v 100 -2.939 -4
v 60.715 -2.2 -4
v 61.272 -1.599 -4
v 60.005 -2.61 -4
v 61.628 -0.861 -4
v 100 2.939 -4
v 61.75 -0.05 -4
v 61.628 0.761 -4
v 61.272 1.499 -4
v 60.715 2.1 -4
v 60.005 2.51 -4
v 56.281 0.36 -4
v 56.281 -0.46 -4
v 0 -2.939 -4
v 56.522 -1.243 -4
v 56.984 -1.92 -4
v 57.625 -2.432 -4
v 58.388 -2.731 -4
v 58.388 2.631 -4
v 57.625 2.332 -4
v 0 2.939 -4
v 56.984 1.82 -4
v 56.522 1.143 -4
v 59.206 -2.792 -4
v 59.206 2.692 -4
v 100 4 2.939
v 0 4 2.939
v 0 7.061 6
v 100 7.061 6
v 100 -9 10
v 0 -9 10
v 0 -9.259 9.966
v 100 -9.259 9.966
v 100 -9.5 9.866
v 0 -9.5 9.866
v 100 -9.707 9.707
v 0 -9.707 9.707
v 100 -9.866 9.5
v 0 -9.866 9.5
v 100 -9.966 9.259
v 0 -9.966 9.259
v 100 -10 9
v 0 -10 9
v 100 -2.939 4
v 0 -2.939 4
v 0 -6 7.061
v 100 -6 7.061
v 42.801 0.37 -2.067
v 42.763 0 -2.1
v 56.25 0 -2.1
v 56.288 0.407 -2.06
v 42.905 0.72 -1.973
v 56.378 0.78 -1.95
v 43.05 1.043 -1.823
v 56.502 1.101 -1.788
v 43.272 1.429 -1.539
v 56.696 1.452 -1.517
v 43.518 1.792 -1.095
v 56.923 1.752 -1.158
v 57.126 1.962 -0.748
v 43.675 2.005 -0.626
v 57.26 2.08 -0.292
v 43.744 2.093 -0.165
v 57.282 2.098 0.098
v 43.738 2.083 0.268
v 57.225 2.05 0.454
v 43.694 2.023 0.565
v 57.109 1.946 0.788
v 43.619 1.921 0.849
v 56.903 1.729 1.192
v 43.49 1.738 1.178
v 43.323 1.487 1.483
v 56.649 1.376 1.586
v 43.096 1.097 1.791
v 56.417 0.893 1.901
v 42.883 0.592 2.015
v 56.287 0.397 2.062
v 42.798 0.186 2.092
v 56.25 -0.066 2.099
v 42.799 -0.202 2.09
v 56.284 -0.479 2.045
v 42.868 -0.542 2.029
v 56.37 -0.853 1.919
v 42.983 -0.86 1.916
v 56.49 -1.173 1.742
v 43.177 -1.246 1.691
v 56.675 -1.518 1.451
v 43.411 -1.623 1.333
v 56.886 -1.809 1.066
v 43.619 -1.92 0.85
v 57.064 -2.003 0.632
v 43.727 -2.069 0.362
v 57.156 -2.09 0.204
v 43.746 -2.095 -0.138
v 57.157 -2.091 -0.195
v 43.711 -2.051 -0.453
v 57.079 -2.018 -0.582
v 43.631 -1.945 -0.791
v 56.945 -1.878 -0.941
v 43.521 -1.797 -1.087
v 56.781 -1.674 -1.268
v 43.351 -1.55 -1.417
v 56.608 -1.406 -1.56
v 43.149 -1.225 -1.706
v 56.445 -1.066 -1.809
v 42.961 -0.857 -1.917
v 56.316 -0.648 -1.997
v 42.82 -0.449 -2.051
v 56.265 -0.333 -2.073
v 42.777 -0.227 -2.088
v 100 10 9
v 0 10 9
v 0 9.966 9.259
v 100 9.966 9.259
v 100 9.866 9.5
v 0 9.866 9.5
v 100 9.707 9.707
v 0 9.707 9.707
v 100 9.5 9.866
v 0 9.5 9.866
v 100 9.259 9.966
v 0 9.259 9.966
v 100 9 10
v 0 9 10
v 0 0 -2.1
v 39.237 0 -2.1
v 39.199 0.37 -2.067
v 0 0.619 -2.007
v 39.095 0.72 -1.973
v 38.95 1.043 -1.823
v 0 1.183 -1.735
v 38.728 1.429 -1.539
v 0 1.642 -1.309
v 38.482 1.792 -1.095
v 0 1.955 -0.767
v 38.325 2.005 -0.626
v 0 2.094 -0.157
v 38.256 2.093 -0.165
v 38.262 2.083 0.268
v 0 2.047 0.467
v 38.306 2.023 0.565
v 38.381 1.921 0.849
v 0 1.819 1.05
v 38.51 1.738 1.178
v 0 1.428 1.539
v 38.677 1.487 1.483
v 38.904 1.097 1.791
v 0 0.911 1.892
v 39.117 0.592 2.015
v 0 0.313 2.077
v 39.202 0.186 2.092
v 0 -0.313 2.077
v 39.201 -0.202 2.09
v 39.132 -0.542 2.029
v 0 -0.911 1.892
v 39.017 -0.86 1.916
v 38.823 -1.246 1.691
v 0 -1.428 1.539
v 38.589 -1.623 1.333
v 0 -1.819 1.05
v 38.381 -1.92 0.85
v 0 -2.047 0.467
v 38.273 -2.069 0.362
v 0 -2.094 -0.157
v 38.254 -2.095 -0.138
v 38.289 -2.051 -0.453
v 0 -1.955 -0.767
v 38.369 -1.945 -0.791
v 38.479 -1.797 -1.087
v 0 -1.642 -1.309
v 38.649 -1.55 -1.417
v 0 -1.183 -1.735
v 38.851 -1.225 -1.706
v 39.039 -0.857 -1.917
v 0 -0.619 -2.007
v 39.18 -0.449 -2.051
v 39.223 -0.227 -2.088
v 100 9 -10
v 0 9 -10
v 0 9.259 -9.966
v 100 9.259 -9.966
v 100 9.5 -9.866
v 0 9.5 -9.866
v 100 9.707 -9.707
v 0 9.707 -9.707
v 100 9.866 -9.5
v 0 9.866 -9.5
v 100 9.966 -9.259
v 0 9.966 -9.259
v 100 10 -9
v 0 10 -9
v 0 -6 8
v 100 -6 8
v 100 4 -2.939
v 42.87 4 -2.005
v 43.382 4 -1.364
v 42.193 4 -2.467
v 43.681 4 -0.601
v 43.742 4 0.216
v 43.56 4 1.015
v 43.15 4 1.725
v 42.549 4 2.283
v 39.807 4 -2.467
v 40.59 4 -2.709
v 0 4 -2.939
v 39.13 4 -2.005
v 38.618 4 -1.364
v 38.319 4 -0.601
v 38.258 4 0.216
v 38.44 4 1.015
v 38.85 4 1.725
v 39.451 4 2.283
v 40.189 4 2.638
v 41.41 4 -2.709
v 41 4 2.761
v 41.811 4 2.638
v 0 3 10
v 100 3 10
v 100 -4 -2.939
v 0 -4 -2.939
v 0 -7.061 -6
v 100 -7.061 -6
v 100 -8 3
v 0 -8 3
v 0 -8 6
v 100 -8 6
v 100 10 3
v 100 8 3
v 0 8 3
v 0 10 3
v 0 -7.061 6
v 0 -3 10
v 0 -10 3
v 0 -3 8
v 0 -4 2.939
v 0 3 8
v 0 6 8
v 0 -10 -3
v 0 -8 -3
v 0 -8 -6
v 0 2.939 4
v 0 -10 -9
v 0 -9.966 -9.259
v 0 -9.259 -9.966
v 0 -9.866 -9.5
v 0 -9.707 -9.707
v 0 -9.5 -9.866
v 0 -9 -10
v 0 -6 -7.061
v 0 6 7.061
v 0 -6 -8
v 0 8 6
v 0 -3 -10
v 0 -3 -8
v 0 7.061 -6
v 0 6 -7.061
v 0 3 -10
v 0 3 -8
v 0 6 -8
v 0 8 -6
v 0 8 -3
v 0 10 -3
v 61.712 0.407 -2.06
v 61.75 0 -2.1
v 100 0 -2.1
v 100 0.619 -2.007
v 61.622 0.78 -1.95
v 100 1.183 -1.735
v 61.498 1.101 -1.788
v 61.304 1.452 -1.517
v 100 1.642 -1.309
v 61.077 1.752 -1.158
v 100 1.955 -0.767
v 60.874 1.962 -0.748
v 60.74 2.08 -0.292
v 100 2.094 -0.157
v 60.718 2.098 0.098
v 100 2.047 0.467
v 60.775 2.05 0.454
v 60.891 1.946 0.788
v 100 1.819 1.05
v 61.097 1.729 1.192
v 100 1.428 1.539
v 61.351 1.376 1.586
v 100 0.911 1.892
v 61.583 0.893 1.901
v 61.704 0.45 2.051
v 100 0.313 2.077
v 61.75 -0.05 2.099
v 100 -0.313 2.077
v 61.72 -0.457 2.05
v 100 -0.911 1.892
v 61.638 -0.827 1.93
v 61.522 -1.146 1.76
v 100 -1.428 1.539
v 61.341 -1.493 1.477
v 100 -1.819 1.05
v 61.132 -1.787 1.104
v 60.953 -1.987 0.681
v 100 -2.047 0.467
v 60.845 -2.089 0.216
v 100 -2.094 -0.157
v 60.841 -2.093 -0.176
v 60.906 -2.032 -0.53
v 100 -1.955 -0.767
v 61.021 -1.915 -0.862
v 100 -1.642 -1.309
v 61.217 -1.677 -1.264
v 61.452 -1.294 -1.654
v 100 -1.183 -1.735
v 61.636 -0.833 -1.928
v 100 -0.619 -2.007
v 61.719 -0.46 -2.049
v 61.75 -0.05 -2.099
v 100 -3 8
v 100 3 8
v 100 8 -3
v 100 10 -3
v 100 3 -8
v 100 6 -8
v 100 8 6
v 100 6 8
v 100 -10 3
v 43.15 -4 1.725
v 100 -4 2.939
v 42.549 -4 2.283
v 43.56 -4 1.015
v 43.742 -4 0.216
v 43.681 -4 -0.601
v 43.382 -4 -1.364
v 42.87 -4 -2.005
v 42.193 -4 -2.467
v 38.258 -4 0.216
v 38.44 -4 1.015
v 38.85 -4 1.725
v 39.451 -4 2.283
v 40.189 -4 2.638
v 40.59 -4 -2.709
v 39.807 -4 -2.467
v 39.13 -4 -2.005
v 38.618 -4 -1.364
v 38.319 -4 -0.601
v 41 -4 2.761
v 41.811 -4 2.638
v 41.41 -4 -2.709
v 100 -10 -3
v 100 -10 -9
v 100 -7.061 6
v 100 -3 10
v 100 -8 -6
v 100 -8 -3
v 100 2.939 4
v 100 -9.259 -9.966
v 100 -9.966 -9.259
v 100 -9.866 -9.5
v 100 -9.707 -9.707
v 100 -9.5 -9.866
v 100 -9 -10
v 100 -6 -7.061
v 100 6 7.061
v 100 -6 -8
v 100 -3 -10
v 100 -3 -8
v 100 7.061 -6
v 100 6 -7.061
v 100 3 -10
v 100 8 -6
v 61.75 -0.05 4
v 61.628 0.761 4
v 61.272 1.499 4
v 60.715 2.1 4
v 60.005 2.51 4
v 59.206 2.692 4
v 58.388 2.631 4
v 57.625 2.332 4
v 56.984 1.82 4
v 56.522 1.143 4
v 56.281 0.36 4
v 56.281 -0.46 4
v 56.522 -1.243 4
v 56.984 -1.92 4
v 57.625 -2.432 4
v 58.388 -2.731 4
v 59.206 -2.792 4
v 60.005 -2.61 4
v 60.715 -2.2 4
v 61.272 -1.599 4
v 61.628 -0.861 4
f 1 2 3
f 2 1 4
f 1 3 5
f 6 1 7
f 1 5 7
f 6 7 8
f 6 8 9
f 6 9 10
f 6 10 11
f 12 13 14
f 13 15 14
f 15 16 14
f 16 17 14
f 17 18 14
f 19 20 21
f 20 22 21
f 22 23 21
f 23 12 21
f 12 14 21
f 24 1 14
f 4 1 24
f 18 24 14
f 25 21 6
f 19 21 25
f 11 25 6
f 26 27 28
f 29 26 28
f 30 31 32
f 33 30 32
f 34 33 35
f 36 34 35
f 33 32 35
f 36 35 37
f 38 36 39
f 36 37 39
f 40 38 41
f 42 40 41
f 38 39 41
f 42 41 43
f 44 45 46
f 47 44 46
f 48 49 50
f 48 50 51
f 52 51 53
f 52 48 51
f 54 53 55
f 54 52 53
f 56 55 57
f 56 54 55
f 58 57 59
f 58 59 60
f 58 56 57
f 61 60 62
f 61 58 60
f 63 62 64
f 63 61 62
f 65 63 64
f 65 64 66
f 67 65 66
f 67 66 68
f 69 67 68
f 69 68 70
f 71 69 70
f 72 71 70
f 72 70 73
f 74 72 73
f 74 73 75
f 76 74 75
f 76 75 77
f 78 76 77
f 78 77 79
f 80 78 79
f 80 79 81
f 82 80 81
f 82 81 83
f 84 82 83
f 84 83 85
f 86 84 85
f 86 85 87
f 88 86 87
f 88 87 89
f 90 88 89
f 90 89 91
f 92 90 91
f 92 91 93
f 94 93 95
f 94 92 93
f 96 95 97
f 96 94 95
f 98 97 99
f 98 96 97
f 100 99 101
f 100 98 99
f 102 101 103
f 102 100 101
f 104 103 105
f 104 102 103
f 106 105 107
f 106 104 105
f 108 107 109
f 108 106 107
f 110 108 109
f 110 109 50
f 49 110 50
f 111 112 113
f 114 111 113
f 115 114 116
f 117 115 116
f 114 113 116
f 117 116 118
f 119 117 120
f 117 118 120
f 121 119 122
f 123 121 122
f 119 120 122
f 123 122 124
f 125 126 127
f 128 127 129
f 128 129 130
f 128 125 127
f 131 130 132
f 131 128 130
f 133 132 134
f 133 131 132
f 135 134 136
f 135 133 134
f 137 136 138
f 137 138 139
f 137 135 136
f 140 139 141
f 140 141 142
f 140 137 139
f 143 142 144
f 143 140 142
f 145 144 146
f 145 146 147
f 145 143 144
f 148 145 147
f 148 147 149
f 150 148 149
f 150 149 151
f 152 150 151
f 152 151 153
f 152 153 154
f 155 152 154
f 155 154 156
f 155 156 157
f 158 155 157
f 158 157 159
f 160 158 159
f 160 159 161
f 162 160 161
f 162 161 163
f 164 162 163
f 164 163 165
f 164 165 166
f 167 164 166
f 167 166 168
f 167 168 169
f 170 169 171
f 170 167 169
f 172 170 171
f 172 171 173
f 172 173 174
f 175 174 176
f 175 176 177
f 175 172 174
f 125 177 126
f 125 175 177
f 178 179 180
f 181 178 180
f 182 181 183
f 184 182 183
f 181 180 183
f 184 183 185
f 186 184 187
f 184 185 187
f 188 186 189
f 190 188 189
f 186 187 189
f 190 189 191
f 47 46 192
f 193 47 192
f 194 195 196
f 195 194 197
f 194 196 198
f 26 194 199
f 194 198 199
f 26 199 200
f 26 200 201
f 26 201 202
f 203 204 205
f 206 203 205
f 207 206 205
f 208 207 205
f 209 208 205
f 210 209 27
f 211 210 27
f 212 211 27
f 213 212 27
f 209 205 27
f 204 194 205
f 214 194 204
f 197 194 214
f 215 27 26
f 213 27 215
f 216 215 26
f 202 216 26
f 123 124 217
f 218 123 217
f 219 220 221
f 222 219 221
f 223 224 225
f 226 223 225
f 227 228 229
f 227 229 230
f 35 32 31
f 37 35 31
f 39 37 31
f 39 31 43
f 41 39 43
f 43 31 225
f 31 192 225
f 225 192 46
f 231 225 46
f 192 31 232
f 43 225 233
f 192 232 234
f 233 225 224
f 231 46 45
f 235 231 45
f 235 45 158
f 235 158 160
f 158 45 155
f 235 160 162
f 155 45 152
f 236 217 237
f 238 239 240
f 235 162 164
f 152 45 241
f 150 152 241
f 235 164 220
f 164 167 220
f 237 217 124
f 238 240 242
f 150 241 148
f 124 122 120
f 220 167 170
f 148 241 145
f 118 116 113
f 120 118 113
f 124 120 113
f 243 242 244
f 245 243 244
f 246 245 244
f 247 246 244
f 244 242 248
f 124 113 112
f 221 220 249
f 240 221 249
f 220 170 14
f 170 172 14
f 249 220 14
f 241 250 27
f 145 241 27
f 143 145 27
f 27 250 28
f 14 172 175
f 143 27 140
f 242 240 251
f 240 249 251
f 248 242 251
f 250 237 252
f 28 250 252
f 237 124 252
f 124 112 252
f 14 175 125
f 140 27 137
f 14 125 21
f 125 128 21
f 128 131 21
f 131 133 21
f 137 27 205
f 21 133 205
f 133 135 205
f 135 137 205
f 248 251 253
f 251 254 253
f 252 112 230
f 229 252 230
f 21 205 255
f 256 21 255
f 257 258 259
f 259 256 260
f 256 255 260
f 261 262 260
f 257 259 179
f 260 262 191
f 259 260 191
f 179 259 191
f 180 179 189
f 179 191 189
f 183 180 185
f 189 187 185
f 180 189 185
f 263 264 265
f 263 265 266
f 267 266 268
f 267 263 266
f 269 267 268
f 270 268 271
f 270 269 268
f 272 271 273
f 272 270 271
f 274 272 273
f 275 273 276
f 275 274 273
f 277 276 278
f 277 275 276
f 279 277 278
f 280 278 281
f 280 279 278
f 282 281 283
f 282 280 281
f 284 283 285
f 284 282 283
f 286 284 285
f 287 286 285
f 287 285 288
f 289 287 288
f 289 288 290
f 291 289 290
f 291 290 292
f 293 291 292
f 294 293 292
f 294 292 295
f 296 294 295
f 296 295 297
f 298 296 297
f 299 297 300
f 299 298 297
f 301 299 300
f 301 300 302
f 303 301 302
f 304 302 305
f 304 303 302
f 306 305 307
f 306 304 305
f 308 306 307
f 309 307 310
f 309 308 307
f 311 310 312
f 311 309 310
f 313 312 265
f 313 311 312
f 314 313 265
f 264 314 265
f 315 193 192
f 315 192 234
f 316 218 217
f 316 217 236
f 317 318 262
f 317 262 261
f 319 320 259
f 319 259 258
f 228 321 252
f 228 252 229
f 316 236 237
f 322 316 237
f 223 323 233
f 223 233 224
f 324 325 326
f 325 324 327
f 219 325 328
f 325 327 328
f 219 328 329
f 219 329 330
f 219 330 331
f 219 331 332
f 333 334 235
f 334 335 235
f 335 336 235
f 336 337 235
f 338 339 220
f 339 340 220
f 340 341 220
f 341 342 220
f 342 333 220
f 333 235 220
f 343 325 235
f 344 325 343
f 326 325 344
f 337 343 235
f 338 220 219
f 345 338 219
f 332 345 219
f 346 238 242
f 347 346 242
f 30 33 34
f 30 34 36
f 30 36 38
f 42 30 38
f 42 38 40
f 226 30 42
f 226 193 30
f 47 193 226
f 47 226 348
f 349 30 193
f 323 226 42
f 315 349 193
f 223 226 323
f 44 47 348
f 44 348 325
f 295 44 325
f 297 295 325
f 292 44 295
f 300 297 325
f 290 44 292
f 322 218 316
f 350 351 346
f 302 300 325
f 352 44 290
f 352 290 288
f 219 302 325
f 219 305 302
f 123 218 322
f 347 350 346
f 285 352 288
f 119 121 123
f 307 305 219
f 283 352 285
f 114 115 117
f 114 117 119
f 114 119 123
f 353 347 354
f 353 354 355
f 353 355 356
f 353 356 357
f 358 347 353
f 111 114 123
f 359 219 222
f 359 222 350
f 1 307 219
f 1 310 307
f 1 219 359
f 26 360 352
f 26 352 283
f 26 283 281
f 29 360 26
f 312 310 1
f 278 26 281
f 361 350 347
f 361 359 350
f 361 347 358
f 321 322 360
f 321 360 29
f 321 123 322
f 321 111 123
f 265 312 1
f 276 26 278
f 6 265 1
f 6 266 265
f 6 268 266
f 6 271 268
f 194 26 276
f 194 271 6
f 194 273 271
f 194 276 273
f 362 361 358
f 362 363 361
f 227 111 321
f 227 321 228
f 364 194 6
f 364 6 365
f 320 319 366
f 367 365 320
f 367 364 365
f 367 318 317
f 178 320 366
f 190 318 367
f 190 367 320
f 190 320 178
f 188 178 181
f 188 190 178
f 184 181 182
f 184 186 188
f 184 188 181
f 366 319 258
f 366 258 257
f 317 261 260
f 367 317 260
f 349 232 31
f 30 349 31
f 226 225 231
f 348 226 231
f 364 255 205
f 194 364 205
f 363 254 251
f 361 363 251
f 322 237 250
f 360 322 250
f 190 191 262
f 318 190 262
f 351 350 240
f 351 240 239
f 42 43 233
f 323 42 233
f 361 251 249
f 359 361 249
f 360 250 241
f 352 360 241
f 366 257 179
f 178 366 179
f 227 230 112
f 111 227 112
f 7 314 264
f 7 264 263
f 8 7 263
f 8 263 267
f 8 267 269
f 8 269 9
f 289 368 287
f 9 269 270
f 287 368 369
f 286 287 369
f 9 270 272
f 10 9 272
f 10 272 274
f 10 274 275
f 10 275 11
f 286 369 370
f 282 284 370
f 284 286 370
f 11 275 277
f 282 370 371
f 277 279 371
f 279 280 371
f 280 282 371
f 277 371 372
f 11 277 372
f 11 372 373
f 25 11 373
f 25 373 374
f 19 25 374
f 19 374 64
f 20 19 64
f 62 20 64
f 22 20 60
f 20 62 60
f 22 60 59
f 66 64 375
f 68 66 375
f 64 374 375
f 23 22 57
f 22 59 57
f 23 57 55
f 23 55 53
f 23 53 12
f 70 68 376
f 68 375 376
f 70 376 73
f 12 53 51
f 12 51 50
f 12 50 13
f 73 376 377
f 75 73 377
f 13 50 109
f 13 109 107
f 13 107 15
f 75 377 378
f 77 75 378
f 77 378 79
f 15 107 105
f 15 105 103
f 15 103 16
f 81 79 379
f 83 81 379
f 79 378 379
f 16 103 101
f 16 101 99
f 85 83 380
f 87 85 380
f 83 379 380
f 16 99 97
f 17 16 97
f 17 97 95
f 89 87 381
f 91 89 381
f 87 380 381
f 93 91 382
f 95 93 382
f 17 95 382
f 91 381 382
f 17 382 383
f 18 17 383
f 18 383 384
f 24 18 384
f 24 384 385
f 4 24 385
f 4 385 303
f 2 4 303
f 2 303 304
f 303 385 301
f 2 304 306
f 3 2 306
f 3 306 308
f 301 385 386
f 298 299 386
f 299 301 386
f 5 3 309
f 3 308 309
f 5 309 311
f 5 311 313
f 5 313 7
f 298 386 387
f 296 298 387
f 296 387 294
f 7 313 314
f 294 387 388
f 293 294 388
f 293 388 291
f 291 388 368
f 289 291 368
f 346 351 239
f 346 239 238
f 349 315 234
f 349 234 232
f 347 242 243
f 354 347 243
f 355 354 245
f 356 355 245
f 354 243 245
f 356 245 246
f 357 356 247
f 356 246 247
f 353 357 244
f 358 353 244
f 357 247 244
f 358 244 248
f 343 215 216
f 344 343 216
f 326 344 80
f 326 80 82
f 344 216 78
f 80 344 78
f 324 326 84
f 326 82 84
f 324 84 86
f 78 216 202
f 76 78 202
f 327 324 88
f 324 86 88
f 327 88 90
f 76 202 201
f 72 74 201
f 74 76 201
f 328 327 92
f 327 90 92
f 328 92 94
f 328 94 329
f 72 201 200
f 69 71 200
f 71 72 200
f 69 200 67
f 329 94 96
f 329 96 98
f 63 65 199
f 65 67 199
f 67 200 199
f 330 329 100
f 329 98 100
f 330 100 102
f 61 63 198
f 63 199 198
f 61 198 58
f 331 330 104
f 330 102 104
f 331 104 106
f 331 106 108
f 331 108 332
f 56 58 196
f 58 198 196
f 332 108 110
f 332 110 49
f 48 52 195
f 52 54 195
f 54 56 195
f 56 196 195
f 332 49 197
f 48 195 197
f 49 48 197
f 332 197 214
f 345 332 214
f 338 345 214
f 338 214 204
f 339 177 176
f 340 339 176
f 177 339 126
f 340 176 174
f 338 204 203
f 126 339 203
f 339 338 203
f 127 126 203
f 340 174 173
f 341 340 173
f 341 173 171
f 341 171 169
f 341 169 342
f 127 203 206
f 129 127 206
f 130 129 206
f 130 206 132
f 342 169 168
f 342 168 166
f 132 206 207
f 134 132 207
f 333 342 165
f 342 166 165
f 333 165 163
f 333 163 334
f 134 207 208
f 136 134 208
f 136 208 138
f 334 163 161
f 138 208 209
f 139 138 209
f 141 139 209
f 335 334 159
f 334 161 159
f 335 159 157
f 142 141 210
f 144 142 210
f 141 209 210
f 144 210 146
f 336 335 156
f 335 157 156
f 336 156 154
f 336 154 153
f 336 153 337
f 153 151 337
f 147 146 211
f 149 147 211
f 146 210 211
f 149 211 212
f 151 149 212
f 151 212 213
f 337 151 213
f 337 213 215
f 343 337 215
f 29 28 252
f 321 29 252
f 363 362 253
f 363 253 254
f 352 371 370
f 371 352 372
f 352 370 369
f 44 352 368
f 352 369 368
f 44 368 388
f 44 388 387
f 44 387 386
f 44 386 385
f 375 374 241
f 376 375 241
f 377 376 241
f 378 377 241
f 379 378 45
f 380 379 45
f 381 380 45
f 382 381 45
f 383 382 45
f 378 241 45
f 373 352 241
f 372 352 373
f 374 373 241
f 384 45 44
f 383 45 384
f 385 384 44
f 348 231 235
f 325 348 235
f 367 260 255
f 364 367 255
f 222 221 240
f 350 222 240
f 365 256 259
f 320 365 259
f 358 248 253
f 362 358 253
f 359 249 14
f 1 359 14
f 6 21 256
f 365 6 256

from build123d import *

# Parameters (mm, degrees)
SKETCH1_R           = 2.1
BOSS_EXTRUDE1_DEPTH = 100
SKETCH_1_R          = 2.75
CUT_EXTRUDE_1_DEPTH = 102.469207152
SKETCH_2_R          = 2.75
CUT_EXTRUDE_2_DEPTH = 102.46920725


with BuildPart() as part:
    # Sketch1 → Boss-Extrude1 (new body)
    with BuildSketch(Plane(origin=(0, 0, 0), x_dir=(0, 0, -1), z_dir=(1, 0, 0))):
        with BuildLine():
            Line((-10, 9), (-10, 3))
            Line((-10, 3), (-8, 3))
            Line((-8, 3), (-8, 6))
            Line((-8, 6), (-7.060660172, 6))
            Line((-7.060660172, 6), (-4, 2.939339828))
            Line((-4, 2.939339828), (-4, -2.939339828))
            Line((-4, -2.939339828), (-7.060660172, -6))
            Line((-7.060660172, -6), (-8, -6))
            Line((-8, -6), (-8, -3))
            Line((-8, -3), (-10, -3))
            Line((-10, -3), (-10, -9))
            ThreePointArc((-10, -9), (-9.707106781, -9.707106781), (-9, -10))
            Line((-9, -10), (-3, -10))
            Line((-3, -10), (-3, -8))
            Line((-3, -8), (-6, -8))
            Line((-6, -8), (-6, -7.060660172))
            Line((-6, -7.060660172), (-2.939339828, -4))
            Line((-2.939339828, -4), (2.939339828, -4))
            Line((2.939339828, -4), (6, -7.060660172))
            Line((6, -7.060660172), (6, -8))
            Line((6, -8), (3, -8))
            Line((3, -8), (3, -10))
            Line((3, -10), (9, -10))
            ThreePointArc((9, -10), (9.707106781, -9.707106781), (10, -9))
            Line((10, -9), (10, -3))
            Line((10, -3), (8, -3))
            Line((8, -3), (8, -6))
            Line((8, -6), (7.060660172, -6))
            Line((7.060660172, -6), (4, -2.939339828))
            Line((4, -2.939339828), (4, 2.939339828))
            Line((4, 2.939339828), (7.060660172, 6))
            Line((7.060660172, 6), (8, 6))
            Line((8, 6), (8, 3))
            Line((8, 3), (10, 3))
            Line((10, 3), (10, 9))
            ThreePointArc((10, 9), (9.707106781, 9.707106781), (9, 10))
            Line((9, 10), (3, 10))
            Line((3, 10), (3, 8))
            Line((3, 8), (6, 8))
            Line((6, 8), (6, 7.060660172))
            Line((6, 7.060660172), (2.939339828, 4))
            Line((2.939339828, 4), (-2.939339828, 4))
            Line((-2.939339828, 4), (-6, 7.060660172))
            Line((-6, 7.060660172), (-6, 8))
            Line((-6, 8), (-3, 8))
            Line((-3, 8), (-3, 10))
            Line((-3, 10), (-9, 10))
            ThreePointArc((-9, 10), (-9.707106781, 9.707106781), (-10, 9))
        make_face()
        Circle(SKETCH1_R, mode=Mode.SUBTRACT)
    extrude(amount=BOSS_EXTRUDE1_DEPTH)

    # 草图1 → 切除-拉伸1 (cut, through all)
    with BuildSketch(Plane(origin=(0, 4, 0), x_dir=(1, 0, 0), z_dir=(0, 1, 0))):
        with Locations((41, -0.010660172)):
            Circle(SKETCH_1_R)
    extrude(amount=-CUT_EXTRUDE_1_DEPTH, mode=Mode.SUBTRACT)

    # 草图2 → 切除-拉伸2 (cut, through all)
    with BuildSketch(Plane.XY.offset(4)):
        with Locations((59, -0.05)):
            Circle(SKETCH_2_R)
    extrude(amount=-CUT_EXTRUDE_2_DEPTH, mode=Mode.SUBTRACT)


solid = part.part
